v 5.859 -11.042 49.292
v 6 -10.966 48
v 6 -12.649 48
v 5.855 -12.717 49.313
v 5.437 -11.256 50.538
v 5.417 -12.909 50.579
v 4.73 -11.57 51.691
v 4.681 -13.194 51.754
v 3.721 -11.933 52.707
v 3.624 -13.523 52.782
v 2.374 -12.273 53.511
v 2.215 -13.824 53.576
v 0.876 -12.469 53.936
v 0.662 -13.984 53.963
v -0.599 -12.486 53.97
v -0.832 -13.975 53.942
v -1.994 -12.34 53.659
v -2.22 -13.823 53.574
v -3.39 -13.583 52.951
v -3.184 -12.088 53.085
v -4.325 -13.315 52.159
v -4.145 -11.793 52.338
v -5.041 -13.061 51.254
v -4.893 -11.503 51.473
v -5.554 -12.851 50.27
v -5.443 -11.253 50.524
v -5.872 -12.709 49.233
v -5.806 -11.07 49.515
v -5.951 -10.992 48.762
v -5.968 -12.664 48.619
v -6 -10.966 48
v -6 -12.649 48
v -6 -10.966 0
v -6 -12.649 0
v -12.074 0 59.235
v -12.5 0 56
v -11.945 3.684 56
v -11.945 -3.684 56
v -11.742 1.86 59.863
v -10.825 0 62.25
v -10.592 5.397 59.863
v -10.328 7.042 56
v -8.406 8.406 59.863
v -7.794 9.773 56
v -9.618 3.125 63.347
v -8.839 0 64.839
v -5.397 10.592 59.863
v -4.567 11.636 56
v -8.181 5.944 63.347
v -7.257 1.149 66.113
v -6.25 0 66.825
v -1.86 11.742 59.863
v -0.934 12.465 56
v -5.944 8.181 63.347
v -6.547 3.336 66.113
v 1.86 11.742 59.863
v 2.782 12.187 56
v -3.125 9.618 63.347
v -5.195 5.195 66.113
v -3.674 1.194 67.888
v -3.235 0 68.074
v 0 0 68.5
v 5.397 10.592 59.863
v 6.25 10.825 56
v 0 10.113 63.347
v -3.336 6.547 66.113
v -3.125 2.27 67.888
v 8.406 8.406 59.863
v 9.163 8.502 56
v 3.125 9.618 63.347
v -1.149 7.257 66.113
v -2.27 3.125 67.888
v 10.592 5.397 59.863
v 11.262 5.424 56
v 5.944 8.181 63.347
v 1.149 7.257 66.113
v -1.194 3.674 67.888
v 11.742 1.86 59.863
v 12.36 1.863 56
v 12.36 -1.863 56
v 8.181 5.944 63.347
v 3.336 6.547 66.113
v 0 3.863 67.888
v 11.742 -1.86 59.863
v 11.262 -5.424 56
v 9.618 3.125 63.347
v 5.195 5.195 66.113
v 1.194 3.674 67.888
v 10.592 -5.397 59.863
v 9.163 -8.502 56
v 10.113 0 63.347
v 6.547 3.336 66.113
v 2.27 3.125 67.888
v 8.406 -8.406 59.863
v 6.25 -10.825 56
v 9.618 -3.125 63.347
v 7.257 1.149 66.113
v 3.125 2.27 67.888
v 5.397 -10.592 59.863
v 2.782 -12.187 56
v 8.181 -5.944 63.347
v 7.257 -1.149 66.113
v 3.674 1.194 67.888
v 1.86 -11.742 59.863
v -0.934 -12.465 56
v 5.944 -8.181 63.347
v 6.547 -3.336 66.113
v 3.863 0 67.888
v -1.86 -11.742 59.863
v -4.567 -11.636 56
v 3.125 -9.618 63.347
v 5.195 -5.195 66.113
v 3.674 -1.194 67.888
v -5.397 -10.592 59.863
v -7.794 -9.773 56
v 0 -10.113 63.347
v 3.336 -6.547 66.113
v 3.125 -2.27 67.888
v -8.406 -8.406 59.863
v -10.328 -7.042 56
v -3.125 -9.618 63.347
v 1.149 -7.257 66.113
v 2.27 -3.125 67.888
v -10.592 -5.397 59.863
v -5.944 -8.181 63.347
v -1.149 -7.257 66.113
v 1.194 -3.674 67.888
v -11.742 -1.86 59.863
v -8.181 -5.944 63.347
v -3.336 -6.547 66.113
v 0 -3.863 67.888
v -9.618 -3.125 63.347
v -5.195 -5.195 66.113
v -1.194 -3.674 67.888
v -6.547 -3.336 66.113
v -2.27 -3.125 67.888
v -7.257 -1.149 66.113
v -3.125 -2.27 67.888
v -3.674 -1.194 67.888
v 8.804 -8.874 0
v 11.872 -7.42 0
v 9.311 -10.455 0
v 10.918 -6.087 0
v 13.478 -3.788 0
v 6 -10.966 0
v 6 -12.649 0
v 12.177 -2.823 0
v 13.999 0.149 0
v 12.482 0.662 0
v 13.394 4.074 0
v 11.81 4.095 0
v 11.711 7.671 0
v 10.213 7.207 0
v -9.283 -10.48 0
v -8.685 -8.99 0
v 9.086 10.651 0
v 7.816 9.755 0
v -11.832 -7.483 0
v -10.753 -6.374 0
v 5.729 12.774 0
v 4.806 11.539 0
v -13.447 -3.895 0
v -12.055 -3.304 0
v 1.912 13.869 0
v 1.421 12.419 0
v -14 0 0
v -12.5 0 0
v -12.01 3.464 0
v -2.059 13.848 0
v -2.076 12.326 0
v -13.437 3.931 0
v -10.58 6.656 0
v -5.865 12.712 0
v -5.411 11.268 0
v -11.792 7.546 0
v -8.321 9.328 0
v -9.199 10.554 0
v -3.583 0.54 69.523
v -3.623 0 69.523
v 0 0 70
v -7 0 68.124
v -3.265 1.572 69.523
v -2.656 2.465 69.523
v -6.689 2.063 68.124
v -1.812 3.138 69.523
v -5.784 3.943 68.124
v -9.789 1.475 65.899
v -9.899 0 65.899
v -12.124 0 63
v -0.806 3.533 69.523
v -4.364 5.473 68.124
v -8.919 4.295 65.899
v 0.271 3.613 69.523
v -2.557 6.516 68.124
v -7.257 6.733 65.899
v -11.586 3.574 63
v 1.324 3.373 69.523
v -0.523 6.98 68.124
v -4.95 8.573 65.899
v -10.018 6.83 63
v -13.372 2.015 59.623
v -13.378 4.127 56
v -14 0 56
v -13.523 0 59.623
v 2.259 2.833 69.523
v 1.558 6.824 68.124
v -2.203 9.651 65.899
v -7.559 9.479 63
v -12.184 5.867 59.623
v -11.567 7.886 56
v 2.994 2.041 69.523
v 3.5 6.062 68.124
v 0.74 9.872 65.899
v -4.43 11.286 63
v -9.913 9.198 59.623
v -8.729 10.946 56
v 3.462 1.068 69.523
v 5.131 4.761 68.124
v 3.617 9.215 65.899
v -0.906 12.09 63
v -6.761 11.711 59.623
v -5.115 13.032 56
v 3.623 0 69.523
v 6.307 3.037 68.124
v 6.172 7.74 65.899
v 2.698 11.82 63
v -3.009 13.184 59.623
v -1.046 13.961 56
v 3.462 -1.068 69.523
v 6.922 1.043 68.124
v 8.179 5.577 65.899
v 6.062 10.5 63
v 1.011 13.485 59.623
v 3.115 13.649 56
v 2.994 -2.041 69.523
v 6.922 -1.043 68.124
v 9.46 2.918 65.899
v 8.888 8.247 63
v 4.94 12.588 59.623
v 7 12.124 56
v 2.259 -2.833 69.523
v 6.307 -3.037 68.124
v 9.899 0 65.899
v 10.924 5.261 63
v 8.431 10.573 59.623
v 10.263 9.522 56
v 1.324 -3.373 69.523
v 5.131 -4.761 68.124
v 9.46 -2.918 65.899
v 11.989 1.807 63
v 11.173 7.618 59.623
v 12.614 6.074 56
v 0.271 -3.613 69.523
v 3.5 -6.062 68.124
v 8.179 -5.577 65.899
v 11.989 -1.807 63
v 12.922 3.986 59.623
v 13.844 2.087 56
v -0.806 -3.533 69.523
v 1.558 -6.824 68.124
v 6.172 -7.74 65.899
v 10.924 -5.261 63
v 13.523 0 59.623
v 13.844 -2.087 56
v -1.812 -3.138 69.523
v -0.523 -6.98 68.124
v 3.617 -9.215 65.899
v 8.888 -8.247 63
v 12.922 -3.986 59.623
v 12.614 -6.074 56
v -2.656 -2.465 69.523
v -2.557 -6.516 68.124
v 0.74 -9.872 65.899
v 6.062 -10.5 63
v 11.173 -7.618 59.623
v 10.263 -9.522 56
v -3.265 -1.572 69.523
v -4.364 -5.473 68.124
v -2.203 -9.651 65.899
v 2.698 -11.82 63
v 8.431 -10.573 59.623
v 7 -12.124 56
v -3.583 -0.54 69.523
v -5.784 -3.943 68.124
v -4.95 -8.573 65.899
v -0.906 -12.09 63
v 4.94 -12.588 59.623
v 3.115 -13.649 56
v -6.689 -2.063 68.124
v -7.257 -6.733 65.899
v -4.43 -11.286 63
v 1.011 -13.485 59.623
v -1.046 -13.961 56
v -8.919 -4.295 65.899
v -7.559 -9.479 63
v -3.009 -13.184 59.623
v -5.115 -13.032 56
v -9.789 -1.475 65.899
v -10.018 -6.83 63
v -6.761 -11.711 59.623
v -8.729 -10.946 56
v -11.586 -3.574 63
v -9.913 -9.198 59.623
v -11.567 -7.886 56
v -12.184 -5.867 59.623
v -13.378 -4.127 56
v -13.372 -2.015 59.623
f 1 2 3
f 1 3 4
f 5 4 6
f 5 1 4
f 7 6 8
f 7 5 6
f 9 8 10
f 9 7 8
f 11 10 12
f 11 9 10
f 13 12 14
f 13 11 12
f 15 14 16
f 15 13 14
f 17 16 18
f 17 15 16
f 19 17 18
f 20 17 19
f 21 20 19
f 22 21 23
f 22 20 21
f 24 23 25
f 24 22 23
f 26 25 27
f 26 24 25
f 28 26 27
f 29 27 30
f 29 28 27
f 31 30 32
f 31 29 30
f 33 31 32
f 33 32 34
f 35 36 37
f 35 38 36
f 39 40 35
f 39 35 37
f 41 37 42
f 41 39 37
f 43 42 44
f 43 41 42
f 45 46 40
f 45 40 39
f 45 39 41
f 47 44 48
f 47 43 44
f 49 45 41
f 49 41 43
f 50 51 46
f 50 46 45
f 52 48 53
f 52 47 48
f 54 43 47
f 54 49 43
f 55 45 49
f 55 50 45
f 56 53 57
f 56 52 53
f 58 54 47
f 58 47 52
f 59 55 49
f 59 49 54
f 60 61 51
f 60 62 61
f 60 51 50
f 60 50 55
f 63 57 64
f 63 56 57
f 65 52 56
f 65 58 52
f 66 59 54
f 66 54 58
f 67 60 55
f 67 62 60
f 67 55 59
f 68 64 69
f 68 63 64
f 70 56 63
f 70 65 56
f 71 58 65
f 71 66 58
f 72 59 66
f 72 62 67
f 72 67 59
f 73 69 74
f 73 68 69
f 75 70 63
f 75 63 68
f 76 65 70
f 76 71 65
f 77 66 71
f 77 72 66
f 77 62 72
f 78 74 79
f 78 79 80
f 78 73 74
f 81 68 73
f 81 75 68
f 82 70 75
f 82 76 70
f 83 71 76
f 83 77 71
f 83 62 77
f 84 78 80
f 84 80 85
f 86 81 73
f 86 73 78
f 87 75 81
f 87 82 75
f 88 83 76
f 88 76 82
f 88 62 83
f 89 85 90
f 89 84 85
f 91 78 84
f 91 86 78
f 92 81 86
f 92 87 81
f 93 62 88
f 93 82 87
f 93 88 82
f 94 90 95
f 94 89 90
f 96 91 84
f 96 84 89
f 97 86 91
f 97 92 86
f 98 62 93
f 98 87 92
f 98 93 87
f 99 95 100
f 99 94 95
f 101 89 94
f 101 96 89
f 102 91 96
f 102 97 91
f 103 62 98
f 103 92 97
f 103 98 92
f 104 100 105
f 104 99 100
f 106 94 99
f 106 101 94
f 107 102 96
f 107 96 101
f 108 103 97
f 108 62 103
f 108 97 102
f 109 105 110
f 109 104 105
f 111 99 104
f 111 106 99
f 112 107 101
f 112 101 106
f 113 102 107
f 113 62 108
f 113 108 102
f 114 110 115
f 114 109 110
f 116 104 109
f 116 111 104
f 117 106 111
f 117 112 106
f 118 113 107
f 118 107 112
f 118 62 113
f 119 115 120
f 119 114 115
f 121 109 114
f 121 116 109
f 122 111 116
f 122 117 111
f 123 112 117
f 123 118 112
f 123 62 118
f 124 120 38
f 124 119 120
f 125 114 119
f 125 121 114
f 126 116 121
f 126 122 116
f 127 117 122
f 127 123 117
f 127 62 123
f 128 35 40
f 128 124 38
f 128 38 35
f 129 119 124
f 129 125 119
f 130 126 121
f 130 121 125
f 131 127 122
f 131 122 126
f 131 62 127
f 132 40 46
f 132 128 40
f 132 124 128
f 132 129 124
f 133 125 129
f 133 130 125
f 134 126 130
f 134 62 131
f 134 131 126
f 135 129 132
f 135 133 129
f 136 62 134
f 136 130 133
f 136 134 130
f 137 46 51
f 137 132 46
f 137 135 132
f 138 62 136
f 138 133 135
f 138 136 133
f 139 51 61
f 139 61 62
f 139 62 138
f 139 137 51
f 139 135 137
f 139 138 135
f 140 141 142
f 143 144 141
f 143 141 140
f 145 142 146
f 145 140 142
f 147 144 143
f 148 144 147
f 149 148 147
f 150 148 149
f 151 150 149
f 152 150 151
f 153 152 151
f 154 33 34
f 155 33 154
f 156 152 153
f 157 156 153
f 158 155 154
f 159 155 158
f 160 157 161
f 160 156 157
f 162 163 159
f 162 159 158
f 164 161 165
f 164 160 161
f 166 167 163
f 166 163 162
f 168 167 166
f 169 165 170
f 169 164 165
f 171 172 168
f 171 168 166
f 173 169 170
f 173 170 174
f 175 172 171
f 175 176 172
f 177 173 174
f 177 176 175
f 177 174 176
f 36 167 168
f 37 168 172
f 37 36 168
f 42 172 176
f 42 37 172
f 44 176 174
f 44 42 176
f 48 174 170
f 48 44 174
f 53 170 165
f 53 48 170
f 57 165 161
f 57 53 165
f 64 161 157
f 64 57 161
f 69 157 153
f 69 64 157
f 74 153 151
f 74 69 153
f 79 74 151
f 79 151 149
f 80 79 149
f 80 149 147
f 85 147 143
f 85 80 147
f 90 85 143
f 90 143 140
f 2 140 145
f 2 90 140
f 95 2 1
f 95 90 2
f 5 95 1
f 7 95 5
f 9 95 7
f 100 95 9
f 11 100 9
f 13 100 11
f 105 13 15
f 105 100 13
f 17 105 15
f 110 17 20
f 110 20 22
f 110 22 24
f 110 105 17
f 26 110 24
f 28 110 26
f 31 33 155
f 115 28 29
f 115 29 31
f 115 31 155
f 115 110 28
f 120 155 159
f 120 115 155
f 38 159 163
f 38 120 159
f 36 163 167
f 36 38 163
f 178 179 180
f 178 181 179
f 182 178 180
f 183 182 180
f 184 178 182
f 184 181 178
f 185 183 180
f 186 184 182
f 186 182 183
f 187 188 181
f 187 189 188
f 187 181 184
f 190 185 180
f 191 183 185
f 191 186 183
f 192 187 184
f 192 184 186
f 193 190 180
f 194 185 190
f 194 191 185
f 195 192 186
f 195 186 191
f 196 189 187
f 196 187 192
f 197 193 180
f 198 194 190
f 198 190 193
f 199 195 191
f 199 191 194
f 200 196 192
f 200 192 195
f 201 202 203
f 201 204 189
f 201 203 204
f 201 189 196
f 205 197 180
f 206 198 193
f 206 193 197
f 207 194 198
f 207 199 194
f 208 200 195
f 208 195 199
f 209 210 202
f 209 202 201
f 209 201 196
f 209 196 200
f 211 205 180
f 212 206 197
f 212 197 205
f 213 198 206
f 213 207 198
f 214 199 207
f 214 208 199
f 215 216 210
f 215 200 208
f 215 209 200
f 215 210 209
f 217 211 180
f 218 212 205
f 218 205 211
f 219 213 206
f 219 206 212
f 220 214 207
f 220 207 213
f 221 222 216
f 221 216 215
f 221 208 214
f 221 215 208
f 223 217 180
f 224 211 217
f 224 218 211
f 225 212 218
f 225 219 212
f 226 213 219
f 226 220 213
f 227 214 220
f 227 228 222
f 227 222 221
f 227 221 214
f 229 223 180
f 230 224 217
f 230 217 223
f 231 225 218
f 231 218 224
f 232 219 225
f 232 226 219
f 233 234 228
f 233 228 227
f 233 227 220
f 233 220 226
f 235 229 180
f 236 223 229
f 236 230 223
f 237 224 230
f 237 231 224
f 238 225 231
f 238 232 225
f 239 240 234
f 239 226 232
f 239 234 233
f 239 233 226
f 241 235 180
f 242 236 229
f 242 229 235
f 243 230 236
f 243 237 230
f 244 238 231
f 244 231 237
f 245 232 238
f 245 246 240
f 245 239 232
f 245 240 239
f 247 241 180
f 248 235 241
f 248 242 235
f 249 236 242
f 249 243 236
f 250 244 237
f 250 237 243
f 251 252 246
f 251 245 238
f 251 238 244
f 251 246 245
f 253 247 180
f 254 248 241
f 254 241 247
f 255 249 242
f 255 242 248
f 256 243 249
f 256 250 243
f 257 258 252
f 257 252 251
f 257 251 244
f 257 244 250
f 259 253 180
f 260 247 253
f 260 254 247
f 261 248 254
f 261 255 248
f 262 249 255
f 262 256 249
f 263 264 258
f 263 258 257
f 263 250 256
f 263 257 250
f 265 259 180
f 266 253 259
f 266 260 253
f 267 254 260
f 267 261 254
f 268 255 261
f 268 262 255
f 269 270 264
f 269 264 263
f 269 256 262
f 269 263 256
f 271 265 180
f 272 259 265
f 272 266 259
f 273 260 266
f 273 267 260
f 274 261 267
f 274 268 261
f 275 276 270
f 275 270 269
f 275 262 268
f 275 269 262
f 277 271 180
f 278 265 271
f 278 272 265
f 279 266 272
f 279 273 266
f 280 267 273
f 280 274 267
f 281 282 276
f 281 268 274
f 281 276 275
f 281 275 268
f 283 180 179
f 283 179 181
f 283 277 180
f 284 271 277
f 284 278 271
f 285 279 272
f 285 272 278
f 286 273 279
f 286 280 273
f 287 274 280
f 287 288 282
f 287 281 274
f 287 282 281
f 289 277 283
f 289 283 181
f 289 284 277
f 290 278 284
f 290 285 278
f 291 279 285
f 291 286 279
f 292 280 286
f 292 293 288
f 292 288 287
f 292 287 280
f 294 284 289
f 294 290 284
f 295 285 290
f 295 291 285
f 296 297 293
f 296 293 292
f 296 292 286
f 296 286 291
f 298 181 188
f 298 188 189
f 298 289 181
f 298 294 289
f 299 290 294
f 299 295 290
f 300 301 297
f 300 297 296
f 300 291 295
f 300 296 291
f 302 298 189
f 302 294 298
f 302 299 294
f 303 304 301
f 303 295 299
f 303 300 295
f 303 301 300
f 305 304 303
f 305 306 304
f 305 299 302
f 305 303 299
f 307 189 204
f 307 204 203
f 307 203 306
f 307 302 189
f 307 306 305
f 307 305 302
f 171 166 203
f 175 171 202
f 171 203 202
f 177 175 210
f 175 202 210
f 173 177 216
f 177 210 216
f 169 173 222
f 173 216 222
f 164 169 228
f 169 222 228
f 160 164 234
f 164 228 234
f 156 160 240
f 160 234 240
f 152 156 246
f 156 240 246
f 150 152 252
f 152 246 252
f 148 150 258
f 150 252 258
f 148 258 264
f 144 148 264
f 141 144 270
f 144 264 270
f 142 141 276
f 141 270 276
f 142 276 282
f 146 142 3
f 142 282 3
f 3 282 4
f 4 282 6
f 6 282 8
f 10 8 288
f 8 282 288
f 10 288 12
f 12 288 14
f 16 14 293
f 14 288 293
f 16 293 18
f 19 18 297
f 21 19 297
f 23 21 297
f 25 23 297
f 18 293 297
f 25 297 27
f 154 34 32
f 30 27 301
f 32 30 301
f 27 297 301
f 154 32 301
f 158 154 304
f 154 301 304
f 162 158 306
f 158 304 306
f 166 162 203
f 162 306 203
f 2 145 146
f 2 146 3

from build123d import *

# Parameters (mm, degrees)
F0_W     = 1.5
F0_H     = 56
F3_DEPTH = 25


with BuildPart() as f1:
    # F0 (on Front) → F1 (revolve)
    with BuildSketch(Plane.XZ):
        with BuildLine():
            ThreePointArc((-12.5, 56), (-8.8388347648, 64.8388347648), (0, 68.5))
            Line((0, 68.5), (0, 70))
            ThreePointArc((0, 70), (-9.8994949366, 65.8994949366), (-14, 56))
            Line((-14, 56), (-12.5, 56))
        make_face()
        with Locations((-13.25, 28)):
            Rectangle(F0_W, F0_H)
    revolve(axis=Axis((0, 0, 28), (0, 0, -1)))

    # F2 (on Front) → F3 (cut)
    with BuildSketch(Plane.XZ):
        with BuildLine():
            Line((6, -2.9855446036), (6, 48))
            ThreePointArc((6, 48), (0, 54), (-6, 48))
            Line((-6, 48), (-6, -2.9855446036))
            Line((-6, -2.9855446036), (6, -2.9855446036))
        make_face()
    extrude(amount=F3_DEPTH, mode=Mode.SUBTRACT)


solid = f1.part
